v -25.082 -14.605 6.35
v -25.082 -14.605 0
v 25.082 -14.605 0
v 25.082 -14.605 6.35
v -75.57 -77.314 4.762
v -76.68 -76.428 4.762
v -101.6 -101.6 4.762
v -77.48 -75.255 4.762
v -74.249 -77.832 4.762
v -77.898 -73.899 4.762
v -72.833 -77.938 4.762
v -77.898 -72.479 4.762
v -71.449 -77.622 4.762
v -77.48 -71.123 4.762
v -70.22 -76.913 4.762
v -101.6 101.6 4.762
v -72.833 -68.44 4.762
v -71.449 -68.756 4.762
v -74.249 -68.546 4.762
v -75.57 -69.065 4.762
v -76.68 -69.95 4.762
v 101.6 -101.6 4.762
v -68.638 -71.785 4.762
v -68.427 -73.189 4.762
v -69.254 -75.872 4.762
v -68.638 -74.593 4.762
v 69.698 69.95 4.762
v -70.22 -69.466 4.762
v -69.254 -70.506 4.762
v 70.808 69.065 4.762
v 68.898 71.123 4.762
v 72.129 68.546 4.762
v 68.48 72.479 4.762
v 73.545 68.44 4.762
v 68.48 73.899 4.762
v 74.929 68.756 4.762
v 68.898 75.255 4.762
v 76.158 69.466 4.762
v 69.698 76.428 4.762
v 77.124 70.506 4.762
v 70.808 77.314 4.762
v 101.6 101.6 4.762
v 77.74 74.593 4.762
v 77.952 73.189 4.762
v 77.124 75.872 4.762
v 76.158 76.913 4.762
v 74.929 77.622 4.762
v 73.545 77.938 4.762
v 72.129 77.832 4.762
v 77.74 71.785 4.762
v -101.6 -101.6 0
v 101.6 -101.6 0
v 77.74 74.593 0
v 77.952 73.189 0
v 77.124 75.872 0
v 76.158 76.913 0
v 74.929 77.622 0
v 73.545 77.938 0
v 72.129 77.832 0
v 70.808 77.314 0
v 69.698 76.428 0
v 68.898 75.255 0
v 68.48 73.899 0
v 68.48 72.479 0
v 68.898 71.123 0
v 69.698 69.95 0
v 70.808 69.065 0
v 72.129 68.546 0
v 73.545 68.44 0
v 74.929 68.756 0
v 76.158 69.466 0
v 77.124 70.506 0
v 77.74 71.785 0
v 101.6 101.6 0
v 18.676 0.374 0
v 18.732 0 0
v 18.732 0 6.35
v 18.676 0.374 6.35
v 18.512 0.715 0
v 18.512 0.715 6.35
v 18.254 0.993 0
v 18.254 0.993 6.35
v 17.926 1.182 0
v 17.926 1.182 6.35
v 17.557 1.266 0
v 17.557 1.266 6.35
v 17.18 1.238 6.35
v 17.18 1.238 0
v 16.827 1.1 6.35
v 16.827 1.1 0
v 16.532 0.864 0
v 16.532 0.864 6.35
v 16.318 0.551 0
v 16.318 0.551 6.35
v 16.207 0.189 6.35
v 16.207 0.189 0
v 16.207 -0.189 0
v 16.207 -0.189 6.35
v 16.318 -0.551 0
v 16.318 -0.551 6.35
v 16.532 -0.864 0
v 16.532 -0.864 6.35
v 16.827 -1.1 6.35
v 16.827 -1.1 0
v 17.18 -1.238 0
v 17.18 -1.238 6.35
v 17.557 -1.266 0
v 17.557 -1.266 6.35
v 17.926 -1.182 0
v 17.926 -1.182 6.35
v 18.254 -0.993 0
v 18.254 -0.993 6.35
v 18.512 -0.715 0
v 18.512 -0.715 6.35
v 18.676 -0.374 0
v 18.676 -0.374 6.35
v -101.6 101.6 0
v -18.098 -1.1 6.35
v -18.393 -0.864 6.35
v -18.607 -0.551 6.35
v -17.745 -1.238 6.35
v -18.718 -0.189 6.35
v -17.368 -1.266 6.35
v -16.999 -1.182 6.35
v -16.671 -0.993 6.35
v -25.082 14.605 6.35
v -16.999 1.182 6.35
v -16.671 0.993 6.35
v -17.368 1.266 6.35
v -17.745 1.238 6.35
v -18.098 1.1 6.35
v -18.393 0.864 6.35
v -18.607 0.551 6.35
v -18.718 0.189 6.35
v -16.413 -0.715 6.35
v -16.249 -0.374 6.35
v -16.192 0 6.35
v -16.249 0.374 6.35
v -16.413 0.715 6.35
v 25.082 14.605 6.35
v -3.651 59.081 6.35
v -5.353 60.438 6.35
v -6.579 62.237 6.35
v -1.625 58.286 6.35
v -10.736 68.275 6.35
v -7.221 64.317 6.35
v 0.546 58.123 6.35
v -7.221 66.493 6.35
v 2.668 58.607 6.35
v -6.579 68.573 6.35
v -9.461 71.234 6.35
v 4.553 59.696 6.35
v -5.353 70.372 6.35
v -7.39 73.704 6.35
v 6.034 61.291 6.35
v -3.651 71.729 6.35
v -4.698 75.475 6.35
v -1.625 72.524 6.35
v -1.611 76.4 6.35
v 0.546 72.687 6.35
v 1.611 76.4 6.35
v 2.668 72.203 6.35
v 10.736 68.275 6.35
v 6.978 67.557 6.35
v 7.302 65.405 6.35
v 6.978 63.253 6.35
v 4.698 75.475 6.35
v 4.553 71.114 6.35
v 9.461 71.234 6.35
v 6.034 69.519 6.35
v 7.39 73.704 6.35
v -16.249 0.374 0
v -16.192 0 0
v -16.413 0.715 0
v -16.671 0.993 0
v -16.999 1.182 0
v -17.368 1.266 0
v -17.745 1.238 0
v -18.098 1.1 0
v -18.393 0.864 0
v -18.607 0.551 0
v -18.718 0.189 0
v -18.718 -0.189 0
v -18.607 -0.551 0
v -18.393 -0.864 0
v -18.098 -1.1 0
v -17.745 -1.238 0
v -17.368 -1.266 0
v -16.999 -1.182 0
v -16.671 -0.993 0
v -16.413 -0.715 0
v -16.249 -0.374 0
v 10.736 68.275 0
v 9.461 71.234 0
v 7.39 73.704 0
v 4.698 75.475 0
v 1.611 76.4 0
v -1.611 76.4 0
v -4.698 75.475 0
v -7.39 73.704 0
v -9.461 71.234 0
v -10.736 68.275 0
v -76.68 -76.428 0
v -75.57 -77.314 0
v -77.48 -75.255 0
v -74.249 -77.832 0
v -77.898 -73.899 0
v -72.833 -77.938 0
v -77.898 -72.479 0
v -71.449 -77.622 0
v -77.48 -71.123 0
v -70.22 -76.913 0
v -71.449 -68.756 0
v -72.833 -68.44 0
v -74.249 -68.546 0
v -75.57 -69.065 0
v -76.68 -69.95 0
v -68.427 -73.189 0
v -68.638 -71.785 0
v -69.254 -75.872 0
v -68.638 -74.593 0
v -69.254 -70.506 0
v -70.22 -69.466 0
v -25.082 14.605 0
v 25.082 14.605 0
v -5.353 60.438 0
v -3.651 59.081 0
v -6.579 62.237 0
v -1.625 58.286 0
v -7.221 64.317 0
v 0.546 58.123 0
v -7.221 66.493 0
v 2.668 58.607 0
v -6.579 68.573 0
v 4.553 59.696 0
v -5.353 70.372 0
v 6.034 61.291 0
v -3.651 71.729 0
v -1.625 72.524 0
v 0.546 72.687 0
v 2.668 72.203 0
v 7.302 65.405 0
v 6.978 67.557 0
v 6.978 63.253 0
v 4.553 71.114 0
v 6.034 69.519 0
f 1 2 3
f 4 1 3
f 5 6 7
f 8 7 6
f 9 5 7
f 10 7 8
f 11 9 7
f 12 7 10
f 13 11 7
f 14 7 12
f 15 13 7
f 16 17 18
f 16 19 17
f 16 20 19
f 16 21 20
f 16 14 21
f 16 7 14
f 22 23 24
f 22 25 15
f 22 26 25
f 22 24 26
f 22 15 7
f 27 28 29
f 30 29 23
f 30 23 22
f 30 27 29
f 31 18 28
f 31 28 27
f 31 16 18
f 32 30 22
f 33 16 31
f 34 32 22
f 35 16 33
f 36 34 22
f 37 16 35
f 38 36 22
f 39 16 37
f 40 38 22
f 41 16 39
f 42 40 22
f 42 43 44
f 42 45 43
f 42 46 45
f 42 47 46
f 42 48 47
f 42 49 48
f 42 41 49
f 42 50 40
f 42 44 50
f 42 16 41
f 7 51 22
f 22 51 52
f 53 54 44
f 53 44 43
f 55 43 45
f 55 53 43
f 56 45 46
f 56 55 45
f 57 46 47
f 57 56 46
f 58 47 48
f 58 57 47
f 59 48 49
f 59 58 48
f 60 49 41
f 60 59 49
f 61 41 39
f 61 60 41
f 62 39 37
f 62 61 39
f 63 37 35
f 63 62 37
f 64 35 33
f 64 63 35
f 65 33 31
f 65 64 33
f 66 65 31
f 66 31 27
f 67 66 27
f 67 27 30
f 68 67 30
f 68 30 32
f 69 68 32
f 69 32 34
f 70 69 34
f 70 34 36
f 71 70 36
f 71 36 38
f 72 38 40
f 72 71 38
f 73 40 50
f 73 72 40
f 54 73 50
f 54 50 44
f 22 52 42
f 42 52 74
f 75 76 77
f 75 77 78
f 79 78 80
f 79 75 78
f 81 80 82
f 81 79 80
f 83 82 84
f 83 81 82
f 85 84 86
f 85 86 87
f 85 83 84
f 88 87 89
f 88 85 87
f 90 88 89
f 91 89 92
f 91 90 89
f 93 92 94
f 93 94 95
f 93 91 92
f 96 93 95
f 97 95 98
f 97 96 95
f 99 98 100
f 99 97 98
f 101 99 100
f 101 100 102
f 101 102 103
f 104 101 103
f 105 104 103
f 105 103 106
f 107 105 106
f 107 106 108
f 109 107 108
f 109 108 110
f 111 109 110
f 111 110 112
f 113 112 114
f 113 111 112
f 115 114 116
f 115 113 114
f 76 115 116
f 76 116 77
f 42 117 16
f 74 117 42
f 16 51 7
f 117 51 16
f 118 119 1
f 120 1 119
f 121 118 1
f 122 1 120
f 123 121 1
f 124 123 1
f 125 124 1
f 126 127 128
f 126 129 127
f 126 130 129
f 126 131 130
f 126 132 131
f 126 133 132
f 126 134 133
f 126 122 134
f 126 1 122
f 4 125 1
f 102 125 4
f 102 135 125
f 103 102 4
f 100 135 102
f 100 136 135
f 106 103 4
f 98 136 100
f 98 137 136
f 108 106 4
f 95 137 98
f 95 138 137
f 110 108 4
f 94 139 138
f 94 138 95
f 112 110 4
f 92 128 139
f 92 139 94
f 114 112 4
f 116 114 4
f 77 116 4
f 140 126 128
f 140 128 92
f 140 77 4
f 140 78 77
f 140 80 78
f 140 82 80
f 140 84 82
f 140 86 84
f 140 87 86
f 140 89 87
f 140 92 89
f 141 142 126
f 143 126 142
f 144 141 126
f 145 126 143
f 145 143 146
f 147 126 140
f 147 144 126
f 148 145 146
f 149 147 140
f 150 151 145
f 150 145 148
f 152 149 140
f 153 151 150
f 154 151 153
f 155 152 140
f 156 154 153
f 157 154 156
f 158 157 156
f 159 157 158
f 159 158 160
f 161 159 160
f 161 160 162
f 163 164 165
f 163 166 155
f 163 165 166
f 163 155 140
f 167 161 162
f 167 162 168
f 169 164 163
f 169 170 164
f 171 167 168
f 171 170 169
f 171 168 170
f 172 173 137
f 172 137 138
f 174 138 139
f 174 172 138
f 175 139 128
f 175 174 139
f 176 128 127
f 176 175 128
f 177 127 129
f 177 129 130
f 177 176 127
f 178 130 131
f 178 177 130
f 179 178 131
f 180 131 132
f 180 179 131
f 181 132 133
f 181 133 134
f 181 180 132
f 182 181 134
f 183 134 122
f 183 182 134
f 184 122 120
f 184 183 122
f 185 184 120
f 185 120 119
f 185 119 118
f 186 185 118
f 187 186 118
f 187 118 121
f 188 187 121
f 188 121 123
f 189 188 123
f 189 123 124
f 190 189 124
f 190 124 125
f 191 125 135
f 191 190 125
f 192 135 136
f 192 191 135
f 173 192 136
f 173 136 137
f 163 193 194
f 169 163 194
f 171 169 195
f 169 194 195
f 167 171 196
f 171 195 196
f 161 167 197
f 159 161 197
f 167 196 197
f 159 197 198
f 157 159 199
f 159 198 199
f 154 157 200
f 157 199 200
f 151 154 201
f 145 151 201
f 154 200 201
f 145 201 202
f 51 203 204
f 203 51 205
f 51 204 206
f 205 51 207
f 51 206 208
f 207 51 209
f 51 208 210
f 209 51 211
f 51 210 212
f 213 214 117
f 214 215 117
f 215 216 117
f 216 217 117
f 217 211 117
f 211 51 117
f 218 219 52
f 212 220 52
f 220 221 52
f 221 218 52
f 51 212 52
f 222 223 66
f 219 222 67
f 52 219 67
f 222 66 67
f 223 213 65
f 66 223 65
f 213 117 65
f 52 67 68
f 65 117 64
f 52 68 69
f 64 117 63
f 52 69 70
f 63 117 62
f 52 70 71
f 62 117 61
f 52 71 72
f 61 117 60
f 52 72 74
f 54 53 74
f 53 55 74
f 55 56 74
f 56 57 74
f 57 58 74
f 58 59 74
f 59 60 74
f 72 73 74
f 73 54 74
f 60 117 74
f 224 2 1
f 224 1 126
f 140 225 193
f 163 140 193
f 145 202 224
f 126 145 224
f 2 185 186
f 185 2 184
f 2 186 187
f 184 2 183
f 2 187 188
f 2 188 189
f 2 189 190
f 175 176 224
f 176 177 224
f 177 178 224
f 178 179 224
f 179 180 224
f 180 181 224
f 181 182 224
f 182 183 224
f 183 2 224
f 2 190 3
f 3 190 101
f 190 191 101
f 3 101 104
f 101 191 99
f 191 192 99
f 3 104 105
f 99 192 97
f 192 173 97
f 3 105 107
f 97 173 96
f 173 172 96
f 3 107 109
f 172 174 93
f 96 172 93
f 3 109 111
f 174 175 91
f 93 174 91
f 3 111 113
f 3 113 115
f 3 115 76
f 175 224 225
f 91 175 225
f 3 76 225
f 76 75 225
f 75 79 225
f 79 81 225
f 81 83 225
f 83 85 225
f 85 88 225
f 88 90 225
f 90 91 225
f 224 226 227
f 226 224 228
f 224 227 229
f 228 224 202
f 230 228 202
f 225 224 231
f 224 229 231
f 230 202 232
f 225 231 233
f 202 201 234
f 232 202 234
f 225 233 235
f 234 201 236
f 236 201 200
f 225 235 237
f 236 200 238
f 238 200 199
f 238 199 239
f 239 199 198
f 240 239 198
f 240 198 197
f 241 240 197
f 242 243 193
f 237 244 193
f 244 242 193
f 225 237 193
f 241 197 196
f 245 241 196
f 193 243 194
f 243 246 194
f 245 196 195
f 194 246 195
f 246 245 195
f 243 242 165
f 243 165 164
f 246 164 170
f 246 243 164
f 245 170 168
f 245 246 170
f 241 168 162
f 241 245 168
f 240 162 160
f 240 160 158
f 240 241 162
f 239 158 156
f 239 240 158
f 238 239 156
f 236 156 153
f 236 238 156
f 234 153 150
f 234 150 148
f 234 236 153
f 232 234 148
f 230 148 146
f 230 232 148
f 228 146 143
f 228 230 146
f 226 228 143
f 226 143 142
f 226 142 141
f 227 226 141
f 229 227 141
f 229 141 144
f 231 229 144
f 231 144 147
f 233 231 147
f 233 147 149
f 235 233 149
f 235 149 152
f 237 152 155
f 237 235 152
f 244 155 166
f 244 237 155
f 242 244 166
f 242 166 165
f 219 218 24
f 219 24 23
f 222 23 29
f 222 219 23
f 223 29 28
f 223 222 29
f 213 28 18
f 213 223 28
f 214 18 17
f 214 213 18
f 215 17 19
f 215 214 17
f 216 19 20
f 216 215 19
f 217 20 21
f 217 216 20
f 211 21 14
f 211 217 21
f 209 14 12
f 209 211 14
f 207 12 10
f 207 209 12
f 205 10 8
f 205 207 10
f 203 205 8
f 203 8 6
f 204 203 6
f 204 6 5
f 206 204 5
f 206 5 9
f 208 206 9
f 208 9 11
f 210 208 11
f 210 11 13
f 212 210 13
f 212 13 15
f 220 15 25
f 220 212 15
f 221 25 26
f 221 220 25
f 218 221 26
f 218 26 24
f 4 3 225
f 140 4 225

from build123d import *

# Parameters (mm, degrees)
F0_W     = 50.165
F0_H     = 29.21
F0_R     = 1.27
F0_R_2   = 7.3025
F1_DEPTH = 6.35
F2_W     = 203.2
F2_H     = 203.2
F2_R     = 4.7625
F3_DEPTH = 4.7625


with BuildPart() as f1:
    # F0 (on Top) → F1 (new body)
    with BuildSketch(Plane.XY):
        Rectangle(F0_W, F0_H)
        with Locations((-17.4625, 0)):
            Circle(F0_R, mode=Mode.SUBTRACT)
        with Locations((17.4625, 0)):
            Circle(F0_R, mode=Mode.SUBTRACT)
        with BuildLine():
            Line((-25.0825, 14.605), (25.0825, 14.605))
            Line((25.0825, 14.605), (10.73554, 68.274814))
            ThreePointArc((10.73554, 68.274814), (11.017857, 66.852233), (11.1125, 65.405))
            ThreePointArc((11.1125, 65.405), (-1.447233, 54.387143), (-10.73554, 68.274814))
            Line((-10.73554, 68.274814), (-25.0825, 14.605))
        make_face()
        with BuildLine():
            ThreePointArc((11.1125, 65.405), (11.017857, 66.852233), (10.73554, 68.274814))
            ThreePointArc((10.73554, 68.274814), (0, 76.5175), (-10.73554, 68.274814))
            ThreePointArc((-10.73554, 68.274814), (-1.447233, 54.387143), (11.1125, 65.405))
        make_face()
        with Locations((0, 65.405)):
            Circle(F0_R_2, mode=Mode.SUBTRACT)
    extrude(amount=F1_DEPTH)


with BuildPart() as f3:
    # F2 (on Top) → F3 (new body)
    with BuildSketch(Plane.XY):
        Rectangle(F2_W, F2_H)
        with Locations((-73.189087, -73.189087)):
            Circle(F2_R, mode=Mode.SUBTRACT)
        with Locations((73.189087, 73.189087)):
            Circle(F2_R, mode=Mode.SUBTRACT)
    extrude(amount=F3_DEPTH)


solid = Compound([f1.part, f3.part])
